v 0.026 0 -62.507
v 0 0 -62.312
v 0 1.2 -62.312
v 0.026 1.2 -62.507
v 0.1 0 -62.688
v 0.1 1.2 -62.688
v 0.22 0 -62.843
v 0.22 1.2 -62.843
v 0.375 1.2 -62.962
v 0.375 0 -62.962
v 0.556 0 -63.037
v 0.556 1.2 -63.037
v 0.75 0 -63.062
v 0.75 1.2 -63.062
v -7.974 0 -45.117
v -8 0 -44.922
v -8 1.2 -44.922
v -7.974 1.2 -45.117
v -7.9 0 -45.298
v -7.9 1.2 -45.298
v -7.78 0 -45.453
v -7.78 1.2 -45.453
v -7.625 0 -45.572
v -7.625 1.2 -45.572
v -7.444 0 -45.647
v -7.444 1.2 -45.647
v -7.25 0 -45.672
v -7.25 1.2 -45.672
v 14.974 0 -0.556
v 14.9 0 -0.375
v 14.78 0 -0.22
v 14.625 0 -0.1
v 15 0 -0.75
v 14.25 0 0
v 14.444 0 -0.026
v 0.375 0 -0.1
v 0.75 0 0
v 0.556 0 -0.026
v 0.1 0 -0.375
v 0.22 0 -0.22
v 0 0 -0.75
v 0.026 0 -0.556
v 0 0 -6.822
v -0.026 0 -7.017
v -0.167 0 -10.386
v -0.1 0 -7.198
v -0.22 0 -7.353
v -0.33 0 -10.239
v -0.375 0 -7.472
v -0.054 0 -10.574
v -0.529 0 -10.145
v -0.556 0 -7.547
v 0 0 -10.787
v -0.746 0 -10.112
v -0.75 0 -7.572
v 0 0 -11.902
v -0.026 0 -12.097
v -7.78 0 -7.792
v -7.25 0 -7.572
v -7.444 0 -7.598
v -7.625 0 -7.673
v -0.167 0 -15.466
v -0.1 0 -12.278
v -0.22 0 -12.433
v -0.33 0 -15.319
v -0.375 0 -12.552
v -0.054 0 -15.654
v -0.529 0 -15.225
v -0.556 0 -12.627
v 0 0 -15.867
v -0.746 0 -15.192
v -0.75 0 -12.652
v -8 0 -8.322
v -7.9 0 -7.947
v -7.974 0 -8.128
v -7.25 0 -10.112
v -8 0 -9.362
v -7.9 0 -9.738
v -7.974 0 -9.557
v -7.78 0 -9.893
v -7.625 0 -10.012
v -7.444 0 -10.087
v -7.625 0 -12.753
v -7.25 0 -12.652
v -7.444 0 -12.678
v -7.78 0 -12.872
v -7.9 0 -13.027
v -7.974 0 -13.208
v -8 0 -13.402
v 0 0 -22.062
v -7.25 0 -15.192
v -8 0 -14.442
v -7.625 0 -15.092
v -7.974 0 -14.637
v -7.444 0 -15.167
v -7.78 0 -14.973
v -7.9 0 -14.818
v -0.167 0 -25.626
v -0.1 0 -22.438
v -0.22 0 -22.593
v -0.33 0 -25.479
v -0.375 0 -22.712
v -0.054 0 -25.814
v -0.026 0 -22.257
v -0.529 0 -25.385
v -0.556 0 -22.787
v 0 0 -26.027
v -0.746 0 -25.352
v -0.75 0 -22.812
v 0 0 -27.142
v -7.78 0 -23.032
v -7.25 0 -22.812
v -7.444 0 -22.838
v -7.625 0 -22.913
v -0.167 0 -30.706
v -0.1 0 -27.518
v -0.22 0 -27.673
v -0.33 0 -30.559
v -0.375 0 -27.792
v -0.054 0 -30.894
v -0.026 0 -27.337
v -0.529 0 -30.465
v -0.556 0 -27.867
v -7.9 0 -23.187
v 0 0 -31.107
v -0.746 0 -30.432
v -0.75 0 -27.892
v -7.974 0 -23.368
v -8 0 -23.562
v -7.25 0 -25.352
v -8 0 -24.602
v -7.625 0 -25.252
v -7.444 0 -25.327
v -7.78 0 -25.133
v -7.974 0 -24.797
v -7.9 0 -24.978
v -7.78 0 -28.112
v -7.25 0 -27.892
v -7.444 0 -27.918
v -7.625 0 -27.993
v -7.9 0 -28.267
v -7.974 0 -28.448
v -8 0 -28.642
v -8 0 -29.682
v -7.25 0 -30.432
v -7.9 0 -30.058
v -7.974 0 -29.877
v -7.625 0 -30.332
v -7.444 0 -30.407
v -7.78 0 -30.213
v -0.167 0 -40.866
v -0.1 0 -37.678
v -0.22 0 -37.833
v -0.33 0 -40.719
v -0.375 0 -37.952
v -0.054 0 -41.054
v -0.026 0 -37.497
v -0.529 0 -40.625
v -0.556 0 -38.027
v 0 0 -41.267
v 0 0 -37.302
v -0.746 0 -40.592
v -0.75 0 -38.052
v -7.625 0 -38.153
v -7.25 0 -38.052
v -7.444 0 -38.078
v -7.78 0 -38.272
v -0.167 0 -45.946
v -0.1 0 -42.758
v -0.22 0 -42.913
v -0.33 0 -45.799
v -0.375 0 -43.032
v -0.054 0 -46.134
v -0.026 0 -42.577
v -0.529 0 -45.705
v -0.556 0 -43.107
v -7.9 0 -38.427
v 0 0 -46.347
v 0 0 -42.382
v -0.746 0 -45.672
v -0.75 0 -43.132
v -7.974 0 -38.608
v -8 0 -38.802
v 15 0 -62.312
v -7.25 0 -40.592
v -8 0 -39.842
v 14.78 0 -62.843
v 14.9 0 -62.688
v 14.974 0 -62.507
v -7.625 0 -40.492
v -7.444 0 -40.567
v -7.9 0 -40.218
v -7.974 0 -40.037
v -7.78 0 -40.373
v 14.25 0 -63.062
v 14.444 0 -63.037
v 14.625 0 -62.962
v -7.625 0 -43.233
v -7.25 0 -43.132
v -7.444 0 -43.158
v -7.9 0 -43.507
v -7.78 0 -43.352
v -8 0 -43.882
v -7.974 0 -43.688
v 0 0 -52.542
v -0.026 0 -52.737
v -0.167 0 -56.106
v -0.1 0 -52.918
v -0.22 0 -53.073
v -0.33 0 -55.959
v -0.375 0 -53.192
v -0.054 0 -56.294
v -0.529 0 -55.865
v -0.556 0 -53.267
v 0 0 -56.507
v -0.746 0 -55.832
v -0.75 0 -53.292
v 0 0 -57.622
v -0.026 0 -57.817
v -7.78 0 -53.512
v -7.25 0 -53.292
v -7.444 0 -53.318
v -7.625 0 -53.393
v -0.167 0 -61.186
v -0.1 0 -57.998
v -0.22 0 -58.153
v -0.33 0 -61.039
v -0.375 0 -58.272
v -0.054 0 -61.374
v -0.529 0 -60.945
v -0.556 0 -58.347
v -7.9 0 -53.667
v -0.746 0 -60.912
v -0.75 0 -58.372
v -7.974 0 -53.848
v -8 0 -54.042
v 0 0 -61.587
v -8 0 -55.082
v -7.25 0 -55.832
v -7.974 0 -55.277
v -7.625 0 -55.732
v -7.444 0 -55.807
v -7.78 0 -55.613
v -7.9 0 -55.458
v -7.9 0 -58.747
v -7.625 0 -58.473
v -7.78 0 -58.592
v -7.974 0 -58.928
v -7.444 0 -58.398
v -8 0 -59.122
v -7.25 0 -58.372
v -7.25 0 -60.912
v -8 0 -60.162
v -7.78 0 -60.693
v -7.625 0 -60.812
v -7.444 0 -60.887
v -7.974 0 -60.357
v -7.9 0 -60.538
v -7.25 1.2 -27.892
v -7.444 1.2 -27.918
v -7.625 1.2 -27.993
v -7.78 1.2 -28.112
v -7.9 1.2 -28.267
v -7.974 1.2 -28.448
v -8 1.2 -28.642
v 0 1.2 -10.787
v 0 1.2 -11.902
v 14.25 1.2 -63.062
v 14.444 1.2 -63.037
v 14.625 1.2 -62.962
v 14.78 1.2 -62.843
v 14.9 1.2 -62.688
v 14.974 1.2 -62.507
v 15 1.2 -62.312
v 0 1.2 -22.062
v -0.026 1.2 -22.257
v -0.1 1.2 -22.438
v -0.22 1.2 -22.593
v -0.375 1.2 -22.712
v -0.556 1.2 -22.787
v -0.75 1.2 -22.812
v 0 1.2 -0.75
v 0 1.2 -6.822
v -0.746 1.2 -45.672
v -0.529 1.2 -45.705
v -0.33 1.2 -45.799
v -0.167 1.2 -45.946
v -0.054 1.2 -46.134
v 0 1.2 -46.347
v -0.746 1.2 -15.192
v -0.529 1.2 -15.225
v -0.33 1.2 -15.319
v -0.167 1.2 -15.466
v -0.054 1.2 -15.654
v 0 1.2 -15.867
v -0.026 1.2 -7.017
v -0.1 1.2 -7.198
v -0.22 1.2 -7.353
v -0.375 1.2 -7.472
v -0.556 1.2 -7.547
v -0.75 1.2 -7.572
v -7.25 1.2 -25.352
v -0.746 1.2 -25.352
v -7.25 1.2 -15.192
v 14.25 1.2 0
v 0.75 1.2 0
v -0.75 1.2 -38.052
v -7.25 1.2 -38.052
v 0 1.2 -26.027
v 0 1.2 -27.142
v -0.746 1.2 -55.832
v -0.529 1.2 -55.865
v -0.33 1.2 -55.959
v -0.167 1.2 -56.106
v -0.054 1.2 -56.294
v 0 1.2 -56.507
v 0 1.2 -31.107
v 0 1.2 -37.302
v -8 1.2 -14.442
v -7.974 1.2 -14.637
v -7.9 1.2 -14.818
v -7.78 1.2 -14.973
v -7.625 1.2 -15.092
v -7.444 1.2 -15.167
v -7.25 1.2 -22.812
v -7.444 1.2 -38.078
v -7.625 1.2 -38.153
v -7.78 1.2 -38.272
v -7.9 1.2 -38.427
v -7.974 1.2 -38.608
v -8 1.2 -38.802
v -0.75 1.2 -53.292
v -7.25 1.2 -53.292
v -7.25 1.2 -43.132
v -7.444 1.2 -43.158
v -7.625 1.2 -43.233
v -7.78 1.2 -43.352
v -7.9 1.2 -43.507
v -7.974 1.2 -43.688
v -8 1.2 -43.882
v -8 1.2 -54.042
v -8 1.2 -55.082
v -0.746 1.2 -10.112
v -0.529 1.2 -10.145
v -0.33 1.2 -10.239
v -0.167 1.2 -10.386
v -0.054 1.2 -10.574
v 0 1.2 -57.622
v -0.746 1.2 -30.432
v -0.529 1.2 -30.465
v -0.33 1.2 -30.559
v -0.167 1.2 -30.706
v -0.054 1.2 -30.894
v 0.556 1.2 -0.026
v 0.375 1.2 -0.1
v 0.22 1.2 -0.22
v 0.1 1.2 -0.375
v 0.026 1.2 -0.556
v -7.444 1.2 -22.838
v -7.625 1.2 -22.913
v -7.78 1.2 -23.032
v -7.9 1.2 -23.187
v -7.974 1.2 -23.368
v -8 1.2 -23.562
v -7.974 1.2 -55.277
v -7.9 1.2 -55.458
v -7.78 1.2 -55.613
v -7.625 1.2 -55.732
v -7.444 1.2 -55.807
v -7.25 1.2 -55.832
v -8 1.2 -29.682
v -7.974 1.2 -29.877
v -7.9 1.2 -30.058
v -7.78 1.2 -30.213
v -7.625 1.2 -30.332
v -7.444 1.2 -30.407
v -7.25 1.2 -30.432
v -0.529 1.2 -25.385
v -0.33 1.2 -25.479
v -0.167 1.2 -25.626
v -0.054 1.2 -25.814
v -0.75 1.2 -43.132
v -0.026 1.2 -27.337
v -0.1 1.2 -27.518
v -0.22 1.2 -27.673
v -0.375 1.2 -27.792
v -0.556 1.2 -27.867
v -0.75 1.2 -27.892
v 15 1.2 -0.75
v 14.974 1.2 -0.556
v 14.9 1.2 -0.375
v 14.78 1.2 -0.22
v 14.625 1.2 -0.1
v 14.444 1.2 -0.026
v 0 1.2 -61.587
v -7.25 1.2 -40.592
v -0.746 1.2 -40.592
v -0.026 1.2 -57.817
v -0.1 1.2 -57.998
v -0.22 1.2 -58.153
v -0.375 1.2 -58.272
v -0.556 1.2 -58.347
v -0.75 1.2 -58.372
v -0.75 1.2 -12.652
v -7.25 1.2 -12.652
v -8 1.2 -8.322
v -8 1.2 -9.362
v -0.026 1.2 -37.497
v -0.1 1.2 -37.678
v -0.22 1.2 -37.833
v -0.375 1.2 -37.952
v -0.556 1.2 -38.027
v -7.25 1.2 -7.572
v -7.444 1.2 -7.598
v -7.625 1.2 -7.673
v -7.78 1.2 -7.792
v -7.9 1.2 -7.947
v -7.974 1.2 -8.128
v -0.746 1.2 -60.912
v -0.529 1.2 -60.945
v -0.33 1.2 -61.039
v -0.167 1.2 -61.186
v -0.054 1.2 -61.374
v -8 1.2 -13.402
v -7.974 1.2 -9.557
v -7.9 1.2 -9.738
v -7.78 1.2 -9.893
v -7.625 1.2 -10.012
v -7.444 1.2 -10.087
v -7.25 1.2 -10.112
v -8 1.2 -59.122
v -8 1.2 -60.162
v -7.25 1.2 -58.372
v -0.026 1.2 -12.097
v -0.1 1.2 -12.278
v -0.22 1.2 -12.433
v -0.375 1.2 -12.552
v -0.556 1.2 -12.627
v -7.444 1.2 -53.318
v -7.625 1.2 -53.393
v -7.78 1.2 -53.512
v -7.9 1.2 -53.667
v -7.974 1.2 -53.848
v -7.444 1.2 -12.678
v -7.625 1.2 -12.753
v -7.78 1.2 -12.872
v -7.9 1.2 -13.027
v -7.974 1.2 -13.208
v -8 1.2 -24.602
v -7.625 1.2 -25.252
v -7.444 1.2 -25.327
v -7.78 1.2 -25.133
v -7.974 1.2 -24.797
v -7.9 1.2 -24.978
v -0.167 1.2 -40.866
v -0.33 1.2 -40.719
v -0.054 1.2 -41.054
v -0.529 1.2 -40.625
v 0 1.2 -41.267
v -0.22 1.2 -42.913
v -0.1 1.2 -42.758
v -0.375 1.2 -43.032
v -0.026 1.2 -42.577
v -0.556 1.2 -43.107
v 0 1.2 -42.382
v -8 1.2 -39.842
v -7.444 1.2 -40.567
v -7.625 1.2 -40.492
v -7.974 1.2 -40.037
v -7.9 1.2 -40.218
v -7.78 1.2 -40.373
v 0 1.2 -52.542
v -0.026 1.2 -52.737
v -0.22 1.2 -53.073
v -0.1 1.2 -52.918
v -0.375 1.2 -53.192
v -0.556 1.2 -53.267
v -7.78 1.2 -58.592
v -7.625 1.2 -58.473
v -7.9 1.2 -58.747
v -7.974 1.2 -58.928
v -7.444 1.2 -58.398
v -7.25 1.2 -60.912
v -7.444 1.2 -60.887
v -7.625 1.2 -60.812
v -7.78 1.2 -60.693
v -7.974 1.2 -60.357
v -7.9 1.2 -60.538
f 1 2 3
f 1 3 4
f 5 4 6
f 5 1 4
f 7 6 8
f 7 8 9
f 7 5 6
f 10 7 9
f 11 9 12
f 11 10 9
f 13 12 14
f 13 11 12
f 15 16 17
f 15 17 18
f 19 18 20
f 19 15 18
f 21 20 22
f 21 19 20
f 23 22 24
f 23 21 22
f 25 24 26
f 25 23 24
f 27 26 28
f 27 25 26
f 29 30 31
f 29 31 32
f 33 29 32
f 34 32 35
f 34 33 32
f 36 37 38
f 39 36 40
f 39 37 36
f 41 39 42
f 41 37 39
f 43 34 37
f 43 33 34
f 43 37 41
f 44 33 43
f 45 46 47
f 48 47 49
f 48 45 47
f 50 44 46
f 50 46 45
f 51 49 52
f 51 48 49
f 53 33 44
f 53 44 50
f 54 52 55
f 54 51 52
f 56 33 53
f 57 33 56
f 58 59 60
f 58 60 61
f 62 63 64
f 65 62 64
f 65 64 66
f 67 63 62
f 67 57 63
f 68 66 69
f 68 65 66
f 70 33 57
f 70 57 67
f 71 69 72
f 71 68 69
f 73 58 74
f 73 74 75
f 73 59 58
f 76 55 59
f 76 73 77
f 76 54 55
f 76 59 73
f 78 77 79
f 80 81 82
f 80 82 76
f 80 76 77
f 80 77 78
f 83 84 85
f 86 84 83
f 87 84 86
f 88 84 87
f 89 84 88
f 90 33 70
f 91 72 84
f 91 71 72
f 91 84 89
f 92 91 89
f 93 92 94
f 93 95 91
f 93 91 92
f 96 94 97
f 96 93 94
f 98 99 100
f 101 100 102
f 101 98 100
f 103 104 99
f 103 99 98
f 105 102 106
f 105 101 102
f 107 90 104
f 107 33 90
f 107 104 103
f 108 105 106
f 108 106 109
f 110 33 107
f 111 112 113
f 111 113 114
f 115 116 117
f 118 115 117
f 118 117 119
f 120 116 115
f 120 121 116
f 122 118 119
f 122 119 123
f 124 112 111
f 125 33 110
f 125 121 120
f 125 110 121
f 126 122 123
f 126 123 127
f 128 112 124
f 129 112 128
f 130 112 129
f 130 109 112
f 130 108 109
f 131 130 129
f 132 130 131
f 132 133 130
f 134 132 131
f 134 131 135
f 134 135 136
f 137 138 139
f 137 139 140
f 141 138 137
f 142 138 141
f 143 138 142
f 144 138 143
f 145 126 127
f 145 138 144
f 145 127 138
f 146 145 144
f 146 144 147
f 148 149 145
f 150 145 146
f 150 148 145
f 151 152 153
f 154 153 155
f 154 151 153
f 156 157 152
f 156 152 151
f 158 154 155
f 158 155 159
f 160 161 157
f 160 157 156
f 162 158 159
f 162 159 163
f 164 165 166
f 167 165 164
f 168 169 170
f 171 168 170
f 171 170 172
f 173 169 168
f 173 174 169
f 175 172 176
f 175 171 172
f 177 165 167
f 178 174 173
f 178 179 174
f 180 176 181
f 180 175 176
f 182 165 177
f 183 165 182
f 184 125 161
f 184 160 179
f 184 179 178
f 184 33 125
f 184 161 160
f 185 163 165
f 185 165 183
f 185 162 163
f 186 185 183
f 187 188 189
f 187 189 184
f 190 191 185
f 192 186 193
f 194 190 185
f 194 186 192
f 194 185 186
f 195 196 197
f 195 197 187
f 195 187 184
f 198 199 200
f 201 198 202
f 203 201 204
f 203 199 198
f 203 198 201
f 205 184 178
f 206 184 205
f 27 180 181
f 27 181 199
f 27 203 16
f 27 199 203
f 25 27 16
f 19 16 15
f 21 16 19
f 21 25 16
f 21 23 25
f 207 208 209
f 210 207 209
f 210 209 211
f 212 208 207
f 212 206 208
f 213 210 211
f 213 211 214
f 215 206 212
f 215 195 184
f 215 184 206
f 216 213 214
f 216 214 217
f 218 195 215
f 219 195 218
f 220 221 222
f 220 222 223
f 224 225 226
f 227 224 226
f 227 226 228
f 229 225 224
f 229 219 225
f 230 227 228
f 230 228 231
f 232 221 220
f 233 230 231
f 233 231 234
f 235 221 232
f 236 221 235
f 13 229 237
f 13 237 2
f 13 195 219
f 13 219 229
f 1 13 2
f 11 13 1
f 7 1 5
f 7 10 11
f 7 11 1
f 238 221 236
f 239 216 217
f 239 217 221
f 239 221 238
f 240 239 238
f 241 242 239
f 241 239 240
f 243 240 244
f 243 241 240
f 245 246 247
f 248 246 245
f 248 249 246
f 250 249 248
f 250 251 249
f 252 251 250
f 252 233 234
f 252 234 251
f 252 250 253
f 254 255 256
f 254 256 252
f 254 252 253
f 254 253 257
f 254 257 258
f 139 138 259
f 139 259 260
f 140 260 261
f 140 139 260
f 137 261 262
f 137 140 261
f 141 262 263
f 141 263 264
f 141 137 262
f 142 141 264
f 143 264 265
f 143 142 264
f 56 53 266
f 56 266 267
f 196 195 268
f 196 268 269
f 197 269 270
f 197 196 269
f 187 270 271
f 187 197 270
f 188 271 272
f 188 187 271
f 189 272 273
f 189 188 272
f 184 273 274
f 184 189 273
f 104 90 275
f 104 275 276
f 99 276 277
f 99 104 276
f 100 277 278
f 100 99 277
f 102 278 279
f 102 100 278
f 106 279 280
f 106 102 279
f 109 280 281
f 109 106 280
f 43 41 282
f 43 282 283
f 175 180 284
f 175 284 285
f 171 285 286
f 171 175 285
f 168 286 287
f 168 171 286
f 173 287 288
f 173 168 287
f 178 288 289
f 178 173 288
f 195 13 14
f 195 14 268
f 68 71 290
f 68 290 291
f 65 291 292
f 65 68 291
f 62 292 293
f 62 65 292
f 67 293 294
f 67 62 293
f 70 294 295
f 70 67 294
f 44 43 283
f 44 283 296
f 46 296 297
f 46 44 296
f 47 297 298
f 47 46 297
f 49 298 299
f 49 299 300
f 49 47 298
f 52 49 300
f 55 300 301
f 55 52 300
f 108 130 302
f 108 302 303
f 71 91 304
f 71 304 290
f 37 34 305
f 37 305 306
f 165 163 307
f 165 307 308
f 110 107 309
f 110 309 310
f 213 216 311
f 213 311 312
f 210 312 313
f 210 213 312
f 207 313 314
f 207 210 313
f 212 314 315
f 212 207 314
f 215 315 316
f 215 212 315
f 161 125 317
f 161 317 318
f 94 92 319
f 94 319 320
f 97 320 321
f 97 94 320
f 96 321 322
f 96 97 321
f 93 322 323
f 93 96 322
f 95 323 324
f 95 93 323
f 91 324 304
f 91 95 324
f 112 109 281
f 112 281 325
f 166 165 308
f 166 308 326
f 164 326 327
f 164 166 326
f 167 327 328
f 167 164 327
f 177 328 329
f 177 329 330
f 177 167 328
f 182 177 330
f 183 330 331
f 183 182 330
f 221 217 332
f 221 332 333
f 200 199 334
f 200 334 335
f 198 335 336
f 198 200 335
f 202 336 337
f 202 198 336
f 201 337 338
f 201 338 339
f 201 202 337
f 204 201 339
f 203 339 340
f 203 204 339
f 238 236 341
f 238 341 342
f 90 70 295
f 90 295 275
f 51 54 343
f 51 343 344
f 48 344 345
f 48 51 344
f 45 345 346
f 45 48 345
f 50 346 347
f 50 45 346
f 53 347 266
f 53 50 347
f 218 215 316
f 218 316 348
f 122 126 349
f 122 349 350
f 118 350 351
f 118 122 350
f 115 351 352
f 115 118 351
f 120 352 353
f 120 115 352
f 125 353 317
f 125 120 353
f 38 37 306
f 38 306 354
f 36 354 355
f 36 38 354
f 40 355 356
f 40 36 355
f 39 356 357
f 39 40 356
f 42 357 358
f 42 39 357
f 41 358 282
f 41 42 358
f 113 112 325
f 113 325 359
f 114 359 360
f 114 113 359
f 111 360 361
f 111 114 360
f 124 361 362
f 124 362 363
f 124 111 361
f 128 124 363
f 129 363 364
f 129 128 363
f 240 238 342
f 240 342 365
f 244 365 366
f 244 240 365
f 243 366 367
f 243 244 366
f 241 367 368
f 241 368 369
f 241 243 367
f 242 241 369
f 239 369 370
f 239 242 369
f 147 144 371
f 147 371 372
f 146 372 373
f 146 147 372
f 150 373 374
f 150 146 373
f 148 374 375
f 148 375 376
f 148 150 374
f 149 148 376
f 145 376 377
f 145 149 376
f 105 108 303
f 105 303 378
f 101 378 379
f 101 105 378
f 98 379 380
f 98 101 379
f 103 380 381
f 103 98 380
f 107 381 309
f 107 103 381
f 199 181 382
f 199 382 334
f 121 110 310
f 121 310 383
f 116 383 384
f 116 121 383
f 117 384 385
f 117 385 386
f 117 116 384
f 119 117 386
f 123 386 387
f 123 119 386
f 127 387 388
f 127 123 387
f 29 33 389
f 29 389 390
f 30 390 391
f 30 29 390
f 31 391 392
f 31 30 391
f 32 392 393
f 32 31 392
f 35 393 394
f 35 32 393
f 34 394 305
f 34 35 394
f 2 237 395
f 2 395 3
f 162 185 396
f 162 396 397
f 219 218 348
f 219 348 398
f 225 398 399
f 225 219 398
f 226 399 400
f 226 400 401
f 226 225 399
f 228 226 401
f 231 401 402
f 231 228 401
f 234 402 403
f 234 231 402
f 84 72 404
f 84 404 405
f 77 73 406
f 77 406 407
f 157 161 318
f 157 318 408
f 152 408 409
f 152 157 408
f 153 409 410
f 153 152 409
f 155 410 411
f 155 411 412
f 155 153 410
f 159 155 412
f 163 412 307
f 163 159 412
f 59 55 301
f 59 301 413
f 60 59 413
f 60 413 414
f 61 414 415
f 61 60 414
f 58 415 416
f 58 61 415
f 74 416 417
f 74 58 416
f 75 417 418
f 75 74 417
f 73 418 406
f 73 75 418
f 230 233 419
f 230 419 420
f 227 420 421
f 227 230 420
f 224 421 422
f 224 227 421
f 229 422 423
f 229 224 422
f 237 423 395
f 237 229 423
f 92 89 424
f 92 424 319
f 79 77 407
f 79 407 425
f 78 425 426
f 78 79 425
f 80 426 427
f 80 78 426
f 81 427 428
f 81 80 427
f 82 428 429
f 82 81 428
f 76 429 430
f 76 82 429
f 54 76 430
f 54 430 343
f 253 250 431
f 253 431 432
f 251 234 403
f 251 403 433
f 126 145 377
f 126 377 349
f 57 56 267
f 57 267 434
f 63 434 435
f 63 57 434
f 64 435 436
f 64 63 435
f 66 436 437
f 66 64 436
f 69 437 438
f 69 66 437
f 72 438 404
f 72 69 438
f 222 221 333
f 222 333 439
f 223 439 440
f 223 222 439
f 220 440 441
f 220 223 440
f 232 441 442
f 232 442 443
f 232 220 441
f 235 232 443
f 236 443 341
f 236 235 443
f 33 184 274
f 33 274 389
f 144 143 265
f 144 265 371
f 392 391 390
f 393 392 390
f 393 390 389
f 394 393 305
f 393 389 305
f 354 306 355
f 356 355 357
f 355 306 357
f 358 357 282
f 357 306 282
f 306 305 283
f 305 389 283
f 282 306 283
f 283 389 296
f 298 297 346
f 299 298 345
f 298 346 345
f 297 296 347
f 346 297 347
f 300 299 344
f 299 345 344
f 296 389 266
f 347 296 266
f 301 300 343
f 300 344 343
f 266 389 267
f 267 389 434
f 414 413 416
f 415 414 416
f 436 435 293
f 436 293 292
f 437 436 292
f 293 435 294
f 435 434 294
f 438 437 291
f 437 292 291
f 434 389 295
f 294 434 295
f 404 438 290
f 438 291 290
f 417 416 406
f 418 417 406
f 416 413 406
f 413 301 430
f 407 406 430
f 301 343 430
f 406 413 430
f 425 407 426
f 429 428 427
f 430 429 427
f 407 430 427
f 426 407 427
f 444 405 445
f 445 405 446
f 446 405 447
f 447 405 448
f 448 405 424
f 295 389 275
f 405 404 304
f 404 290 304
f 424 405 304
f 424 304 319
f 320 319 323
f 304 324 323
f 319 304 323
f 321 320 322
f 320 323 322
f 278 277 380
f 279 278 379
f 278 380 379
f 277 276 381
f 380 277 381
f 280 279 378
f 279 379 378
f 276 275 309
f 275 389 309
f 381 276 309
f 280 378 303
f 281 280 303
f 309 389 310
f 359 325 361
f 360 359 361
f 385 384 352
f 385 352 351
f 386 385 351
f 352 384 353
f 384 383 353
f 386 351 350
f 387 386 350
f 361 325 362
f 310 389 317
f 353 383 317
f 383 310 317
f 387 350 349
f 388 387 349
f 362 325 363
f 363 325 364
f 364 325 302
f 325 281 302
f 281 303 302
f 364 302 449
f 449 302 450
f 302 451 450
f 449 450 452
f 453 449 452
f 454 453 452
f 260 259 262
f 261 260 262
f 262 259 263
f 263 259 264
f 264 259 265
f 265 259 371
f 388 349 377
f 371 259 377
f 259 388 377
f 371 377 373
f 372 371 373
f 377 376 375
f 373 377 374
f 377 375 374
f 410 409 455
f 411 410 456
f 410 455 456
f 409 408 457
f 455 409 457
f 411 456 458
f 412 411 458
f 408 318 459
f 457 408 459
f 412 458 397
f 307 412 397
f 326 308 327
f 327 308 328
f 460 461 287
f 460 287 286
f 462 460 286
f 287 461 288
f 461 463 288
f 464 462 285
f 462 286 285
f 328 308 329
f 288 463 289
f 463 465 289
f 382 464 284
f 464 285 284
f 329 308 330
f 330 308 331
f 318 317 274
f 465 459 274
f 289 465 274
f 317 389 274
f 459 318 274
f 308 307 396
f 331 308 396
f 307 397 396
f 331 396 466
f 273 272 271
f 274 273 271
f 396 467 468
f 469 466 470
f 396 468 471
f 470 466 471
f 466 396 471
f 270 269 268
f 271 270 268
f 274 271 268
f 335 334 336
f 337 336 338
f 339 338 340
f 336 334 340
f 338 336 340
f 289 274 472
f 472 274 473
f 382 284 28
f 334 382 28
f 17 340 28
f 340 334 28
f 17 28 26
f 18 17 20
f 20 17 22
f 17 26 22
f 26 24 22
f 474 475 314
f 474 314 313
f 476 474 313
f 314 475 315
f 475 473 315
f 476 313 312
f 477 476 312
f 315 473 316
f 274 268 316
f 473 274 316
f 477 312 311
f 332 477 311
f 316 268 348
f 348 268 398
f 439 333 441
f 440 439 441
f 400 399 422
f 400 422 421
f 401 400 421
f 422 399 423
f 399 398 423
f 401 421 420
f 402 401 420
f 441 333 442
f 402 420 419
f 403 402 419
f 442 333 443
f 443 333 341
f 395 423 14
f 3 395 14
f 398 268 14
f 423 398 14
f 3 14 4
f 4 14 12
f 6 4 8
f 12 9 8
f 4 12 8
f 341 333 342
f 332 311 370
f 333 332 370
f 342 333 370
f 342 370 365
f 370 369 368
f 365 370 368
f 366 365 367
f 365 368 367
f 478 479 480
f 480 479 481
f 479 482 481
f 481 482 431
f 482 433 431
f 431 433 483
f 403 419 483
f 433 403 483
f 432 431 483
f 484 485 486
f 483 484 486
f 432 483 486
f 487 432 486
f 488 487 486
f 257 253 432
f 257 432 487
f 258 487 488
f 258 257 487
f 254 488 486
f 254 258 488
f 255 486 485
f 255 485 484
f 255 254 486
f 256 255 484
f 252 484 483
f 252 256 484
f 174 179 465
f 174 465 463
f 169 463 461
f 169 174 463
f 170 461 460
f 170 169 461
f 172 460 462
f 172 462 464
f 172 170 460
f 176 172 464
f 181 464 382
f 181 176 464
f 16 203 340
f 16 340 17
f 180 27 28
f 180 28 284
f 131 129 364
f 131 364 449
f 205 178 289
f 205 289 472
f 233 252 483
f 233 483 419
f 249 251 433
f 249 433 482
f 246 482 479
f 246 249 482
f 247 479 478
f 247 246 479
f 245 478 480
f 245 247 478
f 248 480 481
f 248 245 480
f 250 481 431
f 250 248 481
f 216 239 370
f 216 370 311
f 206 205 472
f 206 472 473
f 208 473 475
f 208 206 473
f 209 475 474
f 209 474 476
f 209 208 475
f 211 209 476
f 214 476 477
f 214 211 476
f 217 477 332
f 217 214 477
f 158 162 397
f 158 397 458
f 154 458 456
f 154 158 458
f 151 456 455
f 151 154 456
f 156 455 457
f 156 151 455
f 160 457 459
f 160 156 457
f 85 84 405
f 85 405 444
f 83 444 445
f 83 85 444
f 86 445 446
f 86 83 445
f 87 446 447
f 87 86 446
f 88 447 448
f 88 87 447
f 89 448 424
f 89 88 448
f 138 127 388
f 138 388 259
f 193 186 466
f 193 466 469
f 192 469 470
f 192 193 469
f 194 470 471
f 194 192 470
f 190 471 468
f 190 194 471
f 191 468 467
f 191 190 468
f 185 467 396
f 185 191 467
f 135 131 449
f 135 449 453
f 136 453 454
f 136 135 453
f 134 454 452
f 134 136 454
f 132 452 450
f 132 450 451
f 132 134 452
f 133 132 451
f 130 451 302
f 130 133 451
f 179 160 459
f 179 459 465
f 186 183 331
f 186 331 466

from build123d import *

# Parameters (mm, degrees)
BOSS_EXTRUDE1_DEPTH = 1.2


with BuildPart() as part:
    # Sketch1 → Boss-Extrude1 (new body)
    with BuildSketch(Plane(origin=(0, 0, 0), x_dir=(1, 0, 0), z_dir=(0, 1, 0))):
        with BuildLine():
            Line((-0.75, 7.5725), (-7.25, 7.5725))
            ThreePointArc((-7.25, 7.5725), (-7.780330086, 7.792169914), (-8, 8.3225))
            Line((-8, 8.3225), (-8, 9.3625))
            ThreePointArc((-8, 9.3625), (-7.780330086, 9.892830086), (-7.25, 10.1125))
            Line((-7.25, 10.1125), (-0.746230206, 10.1125))
            ThreePointArc((-0.746230206, 10.1125), (-0.243153345, 10.306250351), (0, 10.787396874))
            Line((0, 10.787396874), (0, 11.9025))
            ThreePointArc((0, 11.9025), (-0.219669914, 12.432830086), (-0.75, 12.6525))
            Line((-0.75, 12.6525), (-7.25, 12.6525))
            ThreePointArc((-7.25, 12.6525), (-7.780330086, 12.872169914), (-8, 13.4025))
            Line((-8, 13.4025), (-8, 14.4425))
            ThreePointArc((-8, 14.4425), (-7.780330086, 14.972830086), (-7.25, 15.1925))
            Line((-7.25, 15.1925), (-0.746230206, 15.1925))
            ThreePointArc((-0.746230206, 15.1925), (-0.243153345, 15.386250351), (0, 15.867396874))
            Line((0, 15.867396874), (0, 22.0625))
            ThreePointArc((0, 22.0625), (-0.219669914, 22.592830086), (-0.75, 22.8125))
            Line((-0.75, 22.8125), (-7.25, 22.8125))
            ThreePointArc((-7.25, 22.8125), (-7.780330086, 23.032169914), (-8, 23.5625))
            Line((-8, 23.5625), (-8, 24.6025))
            ThreePointArc((-8, 24.6025), (-7.780330086, 25.132830086), (-7.25, 25.3525))
            Line((-7.25, 25.3525), (-0.746230206, 25.3525))
            ThreePointArc((-0.746230206, 25.3525), (-0.243153345, 25.546250351), (0, 26.027396874))
            Line((0, 26.027396874), (0, 27.1425))
            ThreePointArc((0, 27.1425), (-0.219669914, 27.672830086), (-0.75, 27.8925))
            Line((-0.75, 27.8925), (-7.25, 27.8925))
            ThreePointArc((-7.25, 27.8925), (-7.780330086, 28.112169914), (-8, 28.6425))
            Line((-8, 28.6425), (-8, 29.6825))
            ThreePointArc((-8, 29.6825), (-7.780330086, 30.212830086), (-7.25, 30.4325))
            Line((-7.25, 30.4325), (-0.746230206, 30.4325))
            ThreePointArc((-0.746230206, 30.4325), (-0.243153345, 30.626250351), (0, 31.107396874))
            Line((0, 31.107396874), (0, 37.3025))
            ThreePointArc((0, 37.3025), (-0.219669914, 37.832830086), (-0.75, 38.0525))
            Line((-0.75, 38.0525), (-7.25, 38.0525))
            ThreePointArc((-7.25, 38.0525), (-7.780330086, 38.272169914), (-8, 38.8025))
            Line((-8, 38.8025), (-8, 39.8425))
            ThreePointArc((-8, 39.8425), (-7.780330086, 40.372830086), (-7.25, 40.5925))
            Line((-7.25, 40.5925), (-0.746230206, 40.5925))
            ThreePointArc((-0.746230206, 40.5925), (-0.243153345, 40.786250351), (0, 41.267396874))
            Line((0, 41.267396874), (0, 42.3825))
            ThreePointArc((0, 42.3825), (-0.219669914, 42.912830086), (-0.75, 43.1325))
            Line((-0.75, 43.1325), (-7.25, 43.1325))
            ThreePointArc((-7.25, 43.1325), (-7.780330086, 43.352169914), (-8, 43.8825))
            Line((-8, 43.8825), (-8, 44.9225))
            ThreePointArc((-8, 44.9225), (-7.780330086, 45.452830086), (-7.25, 45.6725))
            Line((-7.25, 45.6725), (-0.746230206, 45.6725))
            ThreePointArc((-0.746230206, 45.6725), (-0.243153345, 45.866250351), (0, 46.347396874))
            Line((0, 46.347396874), (0, 52.5425))
            ThreePointArc((0, 52.5425), (-0.219669914, 53.072830086), (-0.75, 53.2925))
            Line((-0.75, 53.2925), (-7.25, 53.2925))
            ThreePointArc((-7.25, 53.2925), (-7.780330086, 53.512169914), (-8, 54.0425))
            Line((-8, 54.0425), (-8, 55.0825))
            ThreePointArc((-8, 55.0825), (-7.780330086, 55.612830086), (-7.25, 55.8325))
            Line((-7.25, 55.8325), (-0.746230206, 55.8325))
            ThreePointArc((-0.746230206, 55.8325), (-0.243153345, 56.026250351), (0, 56.507396874))
            Line((0, 56.507396874), (0, 57.6225))
            ThreePointArc((0, 57.6225), (-0.219669914, 58.152830086), (-0.75, 58.3725))
            Line((-0.75, 58.3725), (-7.25, 58.3725))
            ThreePointArc((-7.25, 58.3725), (-7.780330086, 58.592169914), (-8, 59.1225))
            Line((-8, 59.1225), (-8, 60.1625))
            ThreePointArc((-8, 60.1625), (-7.780330086, 60.692830086), (-7.25, 60.9125))
            Line((-7.25, 60.9125), (-0.746230206, 60.9125))
            ThreePointArc((-0.746230206, 60.9125), (-0.243153345, 61.106250351), (0, 61.587396874))
            Line((0, 61.587396874), (0, 62.3125))
            ThreePointArc((0, 62.3125), (0.219669914, 62.842830086), (0.75, 63.0625))
            Line((0.75, 63.0625), (14.25, 63.0625))
            ThreePointArc((14.25, 63.0625), (14.780330086, 62.842830086), (15, 62.3125))
            Line((15, 62.3125), (15, 0.75))
            ThreePointArc((15, 0.75), (14.780330086, 0.219669914), (14.25, 0))
            Line((14.25, 0), (0.75, 0))
            ThreePointArc((0.75, 0), (0.219669914, 0.219669914), (0, 0.75))
            Line((0, 0.75), (0, 6.8225))
            ThreePointArc((0, 6.8225), (-0.219669914, 7.352830086), (-0.75, 7.5725))
        make_face()
    extrude(amount=BOSS_EXTRUDE1_DEPTH)


solid = part.part
